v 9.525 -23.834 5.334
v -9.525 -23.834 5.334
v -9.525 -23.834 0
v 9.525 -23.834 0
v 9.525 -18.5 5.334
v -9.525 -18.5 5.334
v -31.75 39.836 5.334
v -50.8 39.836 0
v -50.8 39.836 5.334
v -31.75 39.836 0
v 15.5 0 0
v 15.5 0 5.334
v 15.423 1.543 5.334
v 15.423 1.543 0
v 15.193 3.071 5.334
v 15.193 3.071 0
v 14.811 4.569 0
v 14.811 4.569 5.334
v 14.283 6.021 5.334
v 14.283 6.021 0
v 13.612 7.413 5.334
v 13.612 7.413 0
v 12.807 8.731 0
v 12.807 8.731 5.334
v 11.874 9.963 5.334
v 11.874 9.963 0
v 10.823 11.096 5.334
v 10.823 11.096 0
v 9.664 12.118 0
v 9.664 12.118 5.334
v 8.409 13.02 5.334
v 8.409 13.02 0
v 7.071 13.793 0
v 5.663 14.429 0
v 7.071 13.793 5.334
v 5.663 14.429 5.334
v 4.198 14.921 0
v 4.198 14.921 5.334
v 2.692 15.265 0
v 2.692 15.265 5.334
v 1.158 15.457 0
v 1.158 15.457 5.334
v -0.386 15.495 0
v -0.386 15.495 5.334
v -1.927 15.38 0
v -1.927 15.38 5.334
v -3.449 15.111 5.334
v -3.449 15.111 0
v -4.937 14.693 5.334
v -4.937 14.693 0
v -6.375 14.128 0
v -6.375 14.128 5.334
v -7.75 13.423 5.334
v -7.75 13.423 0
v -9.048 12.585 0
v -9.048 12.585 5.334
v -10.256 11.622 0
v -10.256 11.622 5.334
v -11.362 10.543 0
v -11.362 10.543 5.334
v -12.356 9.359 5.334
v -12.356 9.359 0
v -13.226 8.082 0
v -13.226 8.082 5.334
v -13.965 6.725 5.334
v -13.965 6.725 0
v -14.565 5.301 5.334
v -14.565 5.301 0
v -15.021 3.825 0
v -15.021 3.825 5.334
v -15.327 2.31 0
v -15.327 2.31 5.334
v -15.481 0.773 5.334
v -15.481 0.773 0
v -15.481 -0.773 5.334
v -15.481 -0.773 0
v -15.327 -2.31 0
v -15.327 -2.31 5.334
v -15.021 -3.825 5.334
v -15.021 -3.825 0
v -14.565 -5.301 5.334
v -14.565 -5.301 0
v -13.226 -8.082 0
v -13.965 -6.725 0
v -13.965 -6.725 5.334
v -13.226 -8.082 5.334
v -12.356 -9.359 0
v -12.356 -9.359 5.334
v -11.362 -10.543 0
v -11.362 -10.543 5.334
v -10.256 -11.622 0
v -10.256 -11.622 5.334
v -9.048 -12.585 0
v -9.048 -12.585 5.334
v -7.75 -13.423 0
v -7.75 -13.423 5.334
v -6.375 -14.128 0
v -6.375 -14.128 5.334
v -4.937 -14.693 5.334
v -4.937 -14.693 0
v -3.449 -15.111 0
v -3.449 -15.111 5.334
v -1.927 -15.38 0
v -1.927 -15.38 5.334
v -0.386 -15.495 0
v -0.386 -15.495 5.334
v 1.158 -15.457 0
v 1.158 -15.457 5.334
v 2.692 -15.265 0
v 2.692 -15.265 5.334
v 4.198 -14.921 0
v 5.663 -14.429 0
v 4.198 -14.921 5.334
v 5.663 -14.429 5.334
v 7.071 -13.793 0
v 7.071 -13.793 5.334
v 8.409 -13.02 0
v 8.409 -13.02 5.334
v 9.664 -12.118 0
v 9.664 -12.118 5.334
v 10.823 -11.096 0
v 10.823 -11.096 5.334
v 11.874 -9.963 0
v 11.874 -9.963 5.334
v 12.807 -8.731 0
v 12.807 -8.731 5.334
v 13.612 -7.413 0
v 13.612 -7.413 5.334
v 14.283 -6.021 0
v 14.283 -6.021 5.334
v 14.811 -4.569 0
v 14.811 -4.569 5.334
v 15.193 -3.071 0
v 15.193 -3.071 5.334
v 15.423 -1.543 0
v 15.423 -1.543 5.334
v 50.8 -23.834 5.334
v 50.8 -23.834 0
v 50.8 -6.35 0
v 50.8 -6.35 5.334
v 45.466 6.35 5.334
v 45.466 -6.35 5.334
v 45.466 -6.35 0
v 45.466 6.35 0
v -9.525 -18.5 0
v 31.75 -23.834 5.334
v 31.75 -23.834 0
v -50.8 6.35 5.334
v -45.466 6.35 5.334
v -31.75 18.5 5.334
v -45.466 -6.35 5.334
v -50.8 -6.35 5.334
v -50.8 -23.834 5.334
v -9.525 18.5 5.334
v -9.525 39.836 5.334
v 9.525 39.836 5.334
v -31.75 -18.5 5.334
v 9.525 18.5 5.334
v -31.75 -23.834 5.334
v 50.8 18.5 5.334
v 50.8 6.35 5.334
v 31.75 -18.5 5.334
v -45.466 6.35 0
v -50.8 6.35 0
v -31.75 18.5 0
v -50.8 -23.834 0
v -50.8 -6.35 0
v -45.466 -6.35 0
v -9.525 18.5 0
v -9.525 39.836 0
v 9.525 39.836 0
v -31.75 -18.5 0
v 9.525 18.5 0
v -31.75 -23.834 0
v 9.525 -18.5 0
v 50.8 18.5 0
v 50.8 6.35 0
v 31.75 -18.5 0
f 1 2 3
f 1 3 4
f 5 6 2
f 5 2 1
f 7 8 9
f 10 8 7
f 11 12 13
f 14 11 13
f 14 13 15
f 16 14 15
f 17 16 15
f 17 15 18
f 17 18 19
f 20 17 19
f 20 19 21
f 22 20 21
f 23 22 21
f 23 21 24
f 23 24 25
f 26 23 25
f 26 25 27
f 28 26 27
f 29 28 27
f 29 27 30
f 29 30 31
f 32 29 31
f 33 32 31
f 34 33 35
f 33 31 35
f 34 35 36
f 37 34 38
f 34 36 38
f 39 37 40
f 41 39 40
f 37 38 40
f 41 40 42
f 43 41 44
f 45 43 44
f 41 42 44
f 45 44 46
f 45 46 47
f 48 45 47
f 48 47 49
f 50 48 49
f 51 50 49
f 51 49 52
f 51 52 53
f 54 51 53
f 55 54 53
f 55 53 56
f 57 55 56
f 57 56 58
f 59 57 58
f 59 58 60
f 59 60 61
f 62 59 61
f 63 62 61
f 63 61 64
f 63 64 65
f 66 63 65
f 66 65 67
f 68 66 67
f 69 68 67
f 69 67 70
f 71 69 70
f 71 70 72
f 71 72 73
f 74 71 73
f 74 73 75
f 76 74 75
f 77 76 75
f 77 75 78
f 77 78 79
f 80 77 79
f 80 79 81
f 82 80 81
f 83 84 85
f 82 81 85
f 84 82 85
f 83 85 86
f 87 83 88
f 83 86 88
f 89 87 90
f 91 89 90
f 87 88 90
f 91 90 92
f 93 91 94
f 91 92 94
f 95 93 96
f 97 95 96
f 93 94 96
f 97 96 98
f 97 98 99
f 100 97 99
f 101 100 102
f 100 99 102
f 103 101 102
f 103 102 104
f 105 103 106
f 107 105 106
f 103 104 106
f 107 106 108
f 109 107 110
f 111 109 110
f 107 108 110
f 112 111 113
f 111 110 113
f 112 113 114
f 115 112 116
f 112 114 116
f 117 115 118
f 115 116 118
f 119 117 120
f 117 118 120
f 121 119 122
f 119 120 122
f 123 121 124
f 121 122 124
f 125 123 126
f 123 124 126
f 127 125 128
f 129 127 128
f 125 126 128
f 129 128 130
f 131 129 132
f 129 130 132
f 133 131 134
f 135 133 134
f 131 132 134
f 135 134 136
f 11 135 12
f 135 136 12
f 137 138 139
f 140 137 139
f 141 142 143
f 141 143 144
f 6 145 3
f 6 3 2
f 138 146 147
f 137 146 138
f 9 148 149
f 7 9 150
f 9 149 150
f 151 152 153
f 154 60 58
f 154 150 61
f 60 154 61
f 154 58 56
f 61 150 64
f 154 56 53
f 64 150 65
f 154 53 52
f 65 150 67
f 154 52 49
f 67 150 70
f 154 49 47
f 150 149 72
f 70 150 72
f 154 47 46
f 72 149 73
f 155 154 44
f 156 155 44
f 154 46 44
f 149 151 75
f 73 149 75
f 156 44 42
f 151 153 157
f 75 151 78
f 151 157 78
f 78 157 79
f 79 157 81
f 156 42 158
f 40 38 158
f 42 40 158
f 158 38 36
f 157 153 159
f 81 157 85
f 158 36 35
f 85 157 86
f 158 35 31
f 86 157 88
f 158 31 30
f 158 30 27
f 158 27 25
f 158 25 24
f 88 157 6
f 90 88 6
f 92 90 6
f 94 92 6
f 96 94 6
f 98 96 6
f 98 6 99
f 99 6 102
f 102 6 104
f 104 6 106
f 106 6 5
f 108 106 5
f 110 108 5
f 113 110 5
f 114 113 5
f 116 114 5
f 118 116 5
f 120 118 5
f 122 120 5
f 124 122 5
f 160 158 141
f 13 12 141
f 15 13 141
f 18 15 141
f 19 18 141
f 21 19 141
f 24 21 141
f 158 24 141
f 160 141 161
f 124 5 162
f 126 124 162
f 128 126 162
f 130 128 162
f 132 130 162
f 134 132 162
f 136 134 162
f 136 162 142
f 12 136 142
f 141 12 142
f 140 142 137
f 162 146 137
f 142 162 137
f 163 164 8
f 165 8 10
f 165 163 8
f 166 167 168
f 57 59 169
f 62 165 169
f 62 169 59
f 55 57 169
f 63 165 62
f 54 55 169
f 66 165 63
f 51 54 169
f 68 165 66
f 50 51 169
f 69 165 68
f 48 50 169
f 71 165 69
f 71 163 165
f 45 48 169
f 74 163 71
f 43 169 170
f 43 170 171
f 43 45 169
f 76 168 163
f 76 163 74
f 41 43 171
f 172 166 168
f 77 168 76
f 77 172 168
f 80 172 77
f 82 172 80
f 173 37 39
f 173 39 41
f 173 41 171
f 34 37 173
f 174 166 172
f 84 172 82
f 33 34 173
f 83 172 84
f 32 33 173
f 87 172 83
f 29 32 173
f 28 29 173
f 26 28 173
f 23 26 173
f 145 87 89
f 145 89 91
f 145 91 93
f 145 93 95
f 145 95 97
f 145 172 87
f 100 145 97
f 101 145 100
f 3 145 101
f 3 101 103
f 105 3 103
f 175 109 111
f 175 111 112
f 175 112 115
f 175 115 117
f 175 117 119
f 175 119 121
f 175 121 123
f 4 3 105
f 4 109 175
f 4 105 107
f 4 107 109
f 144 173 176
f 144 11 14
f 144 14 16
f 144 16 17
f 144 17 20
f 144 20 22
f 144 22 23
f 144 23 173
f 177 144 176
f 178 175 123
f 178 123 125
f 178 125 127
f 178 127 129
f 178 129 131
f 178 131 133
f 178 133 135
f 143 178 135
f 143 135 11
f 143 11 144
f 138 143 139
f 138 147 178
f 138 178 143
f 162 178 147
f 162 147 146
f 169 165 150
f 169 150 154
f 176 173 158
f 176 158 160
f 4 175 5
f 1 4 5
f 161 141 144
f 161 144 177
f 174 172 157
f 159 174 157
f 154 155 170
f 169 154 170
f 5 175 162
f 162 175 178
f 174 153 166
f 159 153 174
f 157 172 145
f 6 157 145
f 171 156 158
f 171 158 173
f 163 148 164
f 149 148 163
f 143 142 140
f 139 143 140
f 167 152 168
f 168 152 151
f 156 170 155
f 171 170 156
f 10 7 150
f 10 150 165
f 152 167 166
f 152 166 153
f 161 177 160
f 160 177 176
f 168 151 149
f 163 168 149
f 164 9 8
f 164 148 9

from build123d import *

# Parameters (mm, degrees)
SKETCH1_W           = 101.6
SKETCH1_H           = 36.999999914
BOSS_EXTRUDE1_DEPTH = 5.334
SKETCH2_R           = 15.499999988
MOTORHOLES_DEPTH    = 55.326251062
SKETCH3_W           = 19.05
SKETCH3_H           = 5.334
SKETCH3_H_2         = 5.334001831
BOTTOMTEETH_DEPTH   = 5.334
SKETCH4_W           = 10.668
SKETCH4_H           = 12.7
SIDECUT_DEPTH       = 57.36622313
SKETCH5_W           = 19.05
SKETCH5_H           = 5.334
TOPTEETH_DEPTH      = 21.336


with BuildPart() as part:
    # Sketch1 → Boss-Extrude1 (new body)
    with BuildSketch(Plane.XY):
        Rectangle(SKETCH1_W, SKETCH1_H)
    extrude(amount=BOSS_EXTRUDE1_DEPTH)

    # Sketch2 → MotorHoles (cut, through all)
    with BuildSketch(Plane.XY.offset(5.334)):
        Circle(SKETCH2_R)
    extrude(amount=-MOTORHOLES_DEPTH, mode=Mode.SUBTRACT)

    # Sketch3 → BottomTeeth (add)
    with BuildSketch(Plane.XZ.offset(18.499999957)):
        with Locations((-41.275, 2.667)):
            Rectangle(SKETCH3_W, SKETCH3_H)
        with Locations((41.275, 2.667)):
            Rectangle(SKETCH3_W, SKETCH3_H)
        with Locations((0, 2.667000916)):
            Rectangle(SKETCH3_W, SKETCH3_H_2)
    extrude(amount=BOTTOMTEETH_DEPTH)

    # Sketch4 → SideCut (cut, through all)
    with BuildSketch(Plane.XY.offset(5.334)):
        with Locations((-50.8, 0)):
            Rectangle(SKETCH4_W, SKETCH4_H)
        with Locations((50.8, 0)):
            Rectangle(SKETCH4_W, SKETCH4_H)
    extrude(amount=-SIDECUT_DEPTH, mode=Mode.SUBTRACT)

    # Sketch5 → TopTeeth (add)
    with BuildSketch(Plane(origin=(0, 18.499999957, 0), x_dir=(1, 0, 0), z_dir=(0, 1, 0))):
        with Locations((-41.275, -2.667)):
            Rectangle(SKETCH5_W, SKETCH5_H)
        with Locations((0, -2.667)):
            Rectangle(SKETCH5_W, SKETCH5_H)
    extrude(amount=TOPTEETH_DEPTH)


solid = part.part
